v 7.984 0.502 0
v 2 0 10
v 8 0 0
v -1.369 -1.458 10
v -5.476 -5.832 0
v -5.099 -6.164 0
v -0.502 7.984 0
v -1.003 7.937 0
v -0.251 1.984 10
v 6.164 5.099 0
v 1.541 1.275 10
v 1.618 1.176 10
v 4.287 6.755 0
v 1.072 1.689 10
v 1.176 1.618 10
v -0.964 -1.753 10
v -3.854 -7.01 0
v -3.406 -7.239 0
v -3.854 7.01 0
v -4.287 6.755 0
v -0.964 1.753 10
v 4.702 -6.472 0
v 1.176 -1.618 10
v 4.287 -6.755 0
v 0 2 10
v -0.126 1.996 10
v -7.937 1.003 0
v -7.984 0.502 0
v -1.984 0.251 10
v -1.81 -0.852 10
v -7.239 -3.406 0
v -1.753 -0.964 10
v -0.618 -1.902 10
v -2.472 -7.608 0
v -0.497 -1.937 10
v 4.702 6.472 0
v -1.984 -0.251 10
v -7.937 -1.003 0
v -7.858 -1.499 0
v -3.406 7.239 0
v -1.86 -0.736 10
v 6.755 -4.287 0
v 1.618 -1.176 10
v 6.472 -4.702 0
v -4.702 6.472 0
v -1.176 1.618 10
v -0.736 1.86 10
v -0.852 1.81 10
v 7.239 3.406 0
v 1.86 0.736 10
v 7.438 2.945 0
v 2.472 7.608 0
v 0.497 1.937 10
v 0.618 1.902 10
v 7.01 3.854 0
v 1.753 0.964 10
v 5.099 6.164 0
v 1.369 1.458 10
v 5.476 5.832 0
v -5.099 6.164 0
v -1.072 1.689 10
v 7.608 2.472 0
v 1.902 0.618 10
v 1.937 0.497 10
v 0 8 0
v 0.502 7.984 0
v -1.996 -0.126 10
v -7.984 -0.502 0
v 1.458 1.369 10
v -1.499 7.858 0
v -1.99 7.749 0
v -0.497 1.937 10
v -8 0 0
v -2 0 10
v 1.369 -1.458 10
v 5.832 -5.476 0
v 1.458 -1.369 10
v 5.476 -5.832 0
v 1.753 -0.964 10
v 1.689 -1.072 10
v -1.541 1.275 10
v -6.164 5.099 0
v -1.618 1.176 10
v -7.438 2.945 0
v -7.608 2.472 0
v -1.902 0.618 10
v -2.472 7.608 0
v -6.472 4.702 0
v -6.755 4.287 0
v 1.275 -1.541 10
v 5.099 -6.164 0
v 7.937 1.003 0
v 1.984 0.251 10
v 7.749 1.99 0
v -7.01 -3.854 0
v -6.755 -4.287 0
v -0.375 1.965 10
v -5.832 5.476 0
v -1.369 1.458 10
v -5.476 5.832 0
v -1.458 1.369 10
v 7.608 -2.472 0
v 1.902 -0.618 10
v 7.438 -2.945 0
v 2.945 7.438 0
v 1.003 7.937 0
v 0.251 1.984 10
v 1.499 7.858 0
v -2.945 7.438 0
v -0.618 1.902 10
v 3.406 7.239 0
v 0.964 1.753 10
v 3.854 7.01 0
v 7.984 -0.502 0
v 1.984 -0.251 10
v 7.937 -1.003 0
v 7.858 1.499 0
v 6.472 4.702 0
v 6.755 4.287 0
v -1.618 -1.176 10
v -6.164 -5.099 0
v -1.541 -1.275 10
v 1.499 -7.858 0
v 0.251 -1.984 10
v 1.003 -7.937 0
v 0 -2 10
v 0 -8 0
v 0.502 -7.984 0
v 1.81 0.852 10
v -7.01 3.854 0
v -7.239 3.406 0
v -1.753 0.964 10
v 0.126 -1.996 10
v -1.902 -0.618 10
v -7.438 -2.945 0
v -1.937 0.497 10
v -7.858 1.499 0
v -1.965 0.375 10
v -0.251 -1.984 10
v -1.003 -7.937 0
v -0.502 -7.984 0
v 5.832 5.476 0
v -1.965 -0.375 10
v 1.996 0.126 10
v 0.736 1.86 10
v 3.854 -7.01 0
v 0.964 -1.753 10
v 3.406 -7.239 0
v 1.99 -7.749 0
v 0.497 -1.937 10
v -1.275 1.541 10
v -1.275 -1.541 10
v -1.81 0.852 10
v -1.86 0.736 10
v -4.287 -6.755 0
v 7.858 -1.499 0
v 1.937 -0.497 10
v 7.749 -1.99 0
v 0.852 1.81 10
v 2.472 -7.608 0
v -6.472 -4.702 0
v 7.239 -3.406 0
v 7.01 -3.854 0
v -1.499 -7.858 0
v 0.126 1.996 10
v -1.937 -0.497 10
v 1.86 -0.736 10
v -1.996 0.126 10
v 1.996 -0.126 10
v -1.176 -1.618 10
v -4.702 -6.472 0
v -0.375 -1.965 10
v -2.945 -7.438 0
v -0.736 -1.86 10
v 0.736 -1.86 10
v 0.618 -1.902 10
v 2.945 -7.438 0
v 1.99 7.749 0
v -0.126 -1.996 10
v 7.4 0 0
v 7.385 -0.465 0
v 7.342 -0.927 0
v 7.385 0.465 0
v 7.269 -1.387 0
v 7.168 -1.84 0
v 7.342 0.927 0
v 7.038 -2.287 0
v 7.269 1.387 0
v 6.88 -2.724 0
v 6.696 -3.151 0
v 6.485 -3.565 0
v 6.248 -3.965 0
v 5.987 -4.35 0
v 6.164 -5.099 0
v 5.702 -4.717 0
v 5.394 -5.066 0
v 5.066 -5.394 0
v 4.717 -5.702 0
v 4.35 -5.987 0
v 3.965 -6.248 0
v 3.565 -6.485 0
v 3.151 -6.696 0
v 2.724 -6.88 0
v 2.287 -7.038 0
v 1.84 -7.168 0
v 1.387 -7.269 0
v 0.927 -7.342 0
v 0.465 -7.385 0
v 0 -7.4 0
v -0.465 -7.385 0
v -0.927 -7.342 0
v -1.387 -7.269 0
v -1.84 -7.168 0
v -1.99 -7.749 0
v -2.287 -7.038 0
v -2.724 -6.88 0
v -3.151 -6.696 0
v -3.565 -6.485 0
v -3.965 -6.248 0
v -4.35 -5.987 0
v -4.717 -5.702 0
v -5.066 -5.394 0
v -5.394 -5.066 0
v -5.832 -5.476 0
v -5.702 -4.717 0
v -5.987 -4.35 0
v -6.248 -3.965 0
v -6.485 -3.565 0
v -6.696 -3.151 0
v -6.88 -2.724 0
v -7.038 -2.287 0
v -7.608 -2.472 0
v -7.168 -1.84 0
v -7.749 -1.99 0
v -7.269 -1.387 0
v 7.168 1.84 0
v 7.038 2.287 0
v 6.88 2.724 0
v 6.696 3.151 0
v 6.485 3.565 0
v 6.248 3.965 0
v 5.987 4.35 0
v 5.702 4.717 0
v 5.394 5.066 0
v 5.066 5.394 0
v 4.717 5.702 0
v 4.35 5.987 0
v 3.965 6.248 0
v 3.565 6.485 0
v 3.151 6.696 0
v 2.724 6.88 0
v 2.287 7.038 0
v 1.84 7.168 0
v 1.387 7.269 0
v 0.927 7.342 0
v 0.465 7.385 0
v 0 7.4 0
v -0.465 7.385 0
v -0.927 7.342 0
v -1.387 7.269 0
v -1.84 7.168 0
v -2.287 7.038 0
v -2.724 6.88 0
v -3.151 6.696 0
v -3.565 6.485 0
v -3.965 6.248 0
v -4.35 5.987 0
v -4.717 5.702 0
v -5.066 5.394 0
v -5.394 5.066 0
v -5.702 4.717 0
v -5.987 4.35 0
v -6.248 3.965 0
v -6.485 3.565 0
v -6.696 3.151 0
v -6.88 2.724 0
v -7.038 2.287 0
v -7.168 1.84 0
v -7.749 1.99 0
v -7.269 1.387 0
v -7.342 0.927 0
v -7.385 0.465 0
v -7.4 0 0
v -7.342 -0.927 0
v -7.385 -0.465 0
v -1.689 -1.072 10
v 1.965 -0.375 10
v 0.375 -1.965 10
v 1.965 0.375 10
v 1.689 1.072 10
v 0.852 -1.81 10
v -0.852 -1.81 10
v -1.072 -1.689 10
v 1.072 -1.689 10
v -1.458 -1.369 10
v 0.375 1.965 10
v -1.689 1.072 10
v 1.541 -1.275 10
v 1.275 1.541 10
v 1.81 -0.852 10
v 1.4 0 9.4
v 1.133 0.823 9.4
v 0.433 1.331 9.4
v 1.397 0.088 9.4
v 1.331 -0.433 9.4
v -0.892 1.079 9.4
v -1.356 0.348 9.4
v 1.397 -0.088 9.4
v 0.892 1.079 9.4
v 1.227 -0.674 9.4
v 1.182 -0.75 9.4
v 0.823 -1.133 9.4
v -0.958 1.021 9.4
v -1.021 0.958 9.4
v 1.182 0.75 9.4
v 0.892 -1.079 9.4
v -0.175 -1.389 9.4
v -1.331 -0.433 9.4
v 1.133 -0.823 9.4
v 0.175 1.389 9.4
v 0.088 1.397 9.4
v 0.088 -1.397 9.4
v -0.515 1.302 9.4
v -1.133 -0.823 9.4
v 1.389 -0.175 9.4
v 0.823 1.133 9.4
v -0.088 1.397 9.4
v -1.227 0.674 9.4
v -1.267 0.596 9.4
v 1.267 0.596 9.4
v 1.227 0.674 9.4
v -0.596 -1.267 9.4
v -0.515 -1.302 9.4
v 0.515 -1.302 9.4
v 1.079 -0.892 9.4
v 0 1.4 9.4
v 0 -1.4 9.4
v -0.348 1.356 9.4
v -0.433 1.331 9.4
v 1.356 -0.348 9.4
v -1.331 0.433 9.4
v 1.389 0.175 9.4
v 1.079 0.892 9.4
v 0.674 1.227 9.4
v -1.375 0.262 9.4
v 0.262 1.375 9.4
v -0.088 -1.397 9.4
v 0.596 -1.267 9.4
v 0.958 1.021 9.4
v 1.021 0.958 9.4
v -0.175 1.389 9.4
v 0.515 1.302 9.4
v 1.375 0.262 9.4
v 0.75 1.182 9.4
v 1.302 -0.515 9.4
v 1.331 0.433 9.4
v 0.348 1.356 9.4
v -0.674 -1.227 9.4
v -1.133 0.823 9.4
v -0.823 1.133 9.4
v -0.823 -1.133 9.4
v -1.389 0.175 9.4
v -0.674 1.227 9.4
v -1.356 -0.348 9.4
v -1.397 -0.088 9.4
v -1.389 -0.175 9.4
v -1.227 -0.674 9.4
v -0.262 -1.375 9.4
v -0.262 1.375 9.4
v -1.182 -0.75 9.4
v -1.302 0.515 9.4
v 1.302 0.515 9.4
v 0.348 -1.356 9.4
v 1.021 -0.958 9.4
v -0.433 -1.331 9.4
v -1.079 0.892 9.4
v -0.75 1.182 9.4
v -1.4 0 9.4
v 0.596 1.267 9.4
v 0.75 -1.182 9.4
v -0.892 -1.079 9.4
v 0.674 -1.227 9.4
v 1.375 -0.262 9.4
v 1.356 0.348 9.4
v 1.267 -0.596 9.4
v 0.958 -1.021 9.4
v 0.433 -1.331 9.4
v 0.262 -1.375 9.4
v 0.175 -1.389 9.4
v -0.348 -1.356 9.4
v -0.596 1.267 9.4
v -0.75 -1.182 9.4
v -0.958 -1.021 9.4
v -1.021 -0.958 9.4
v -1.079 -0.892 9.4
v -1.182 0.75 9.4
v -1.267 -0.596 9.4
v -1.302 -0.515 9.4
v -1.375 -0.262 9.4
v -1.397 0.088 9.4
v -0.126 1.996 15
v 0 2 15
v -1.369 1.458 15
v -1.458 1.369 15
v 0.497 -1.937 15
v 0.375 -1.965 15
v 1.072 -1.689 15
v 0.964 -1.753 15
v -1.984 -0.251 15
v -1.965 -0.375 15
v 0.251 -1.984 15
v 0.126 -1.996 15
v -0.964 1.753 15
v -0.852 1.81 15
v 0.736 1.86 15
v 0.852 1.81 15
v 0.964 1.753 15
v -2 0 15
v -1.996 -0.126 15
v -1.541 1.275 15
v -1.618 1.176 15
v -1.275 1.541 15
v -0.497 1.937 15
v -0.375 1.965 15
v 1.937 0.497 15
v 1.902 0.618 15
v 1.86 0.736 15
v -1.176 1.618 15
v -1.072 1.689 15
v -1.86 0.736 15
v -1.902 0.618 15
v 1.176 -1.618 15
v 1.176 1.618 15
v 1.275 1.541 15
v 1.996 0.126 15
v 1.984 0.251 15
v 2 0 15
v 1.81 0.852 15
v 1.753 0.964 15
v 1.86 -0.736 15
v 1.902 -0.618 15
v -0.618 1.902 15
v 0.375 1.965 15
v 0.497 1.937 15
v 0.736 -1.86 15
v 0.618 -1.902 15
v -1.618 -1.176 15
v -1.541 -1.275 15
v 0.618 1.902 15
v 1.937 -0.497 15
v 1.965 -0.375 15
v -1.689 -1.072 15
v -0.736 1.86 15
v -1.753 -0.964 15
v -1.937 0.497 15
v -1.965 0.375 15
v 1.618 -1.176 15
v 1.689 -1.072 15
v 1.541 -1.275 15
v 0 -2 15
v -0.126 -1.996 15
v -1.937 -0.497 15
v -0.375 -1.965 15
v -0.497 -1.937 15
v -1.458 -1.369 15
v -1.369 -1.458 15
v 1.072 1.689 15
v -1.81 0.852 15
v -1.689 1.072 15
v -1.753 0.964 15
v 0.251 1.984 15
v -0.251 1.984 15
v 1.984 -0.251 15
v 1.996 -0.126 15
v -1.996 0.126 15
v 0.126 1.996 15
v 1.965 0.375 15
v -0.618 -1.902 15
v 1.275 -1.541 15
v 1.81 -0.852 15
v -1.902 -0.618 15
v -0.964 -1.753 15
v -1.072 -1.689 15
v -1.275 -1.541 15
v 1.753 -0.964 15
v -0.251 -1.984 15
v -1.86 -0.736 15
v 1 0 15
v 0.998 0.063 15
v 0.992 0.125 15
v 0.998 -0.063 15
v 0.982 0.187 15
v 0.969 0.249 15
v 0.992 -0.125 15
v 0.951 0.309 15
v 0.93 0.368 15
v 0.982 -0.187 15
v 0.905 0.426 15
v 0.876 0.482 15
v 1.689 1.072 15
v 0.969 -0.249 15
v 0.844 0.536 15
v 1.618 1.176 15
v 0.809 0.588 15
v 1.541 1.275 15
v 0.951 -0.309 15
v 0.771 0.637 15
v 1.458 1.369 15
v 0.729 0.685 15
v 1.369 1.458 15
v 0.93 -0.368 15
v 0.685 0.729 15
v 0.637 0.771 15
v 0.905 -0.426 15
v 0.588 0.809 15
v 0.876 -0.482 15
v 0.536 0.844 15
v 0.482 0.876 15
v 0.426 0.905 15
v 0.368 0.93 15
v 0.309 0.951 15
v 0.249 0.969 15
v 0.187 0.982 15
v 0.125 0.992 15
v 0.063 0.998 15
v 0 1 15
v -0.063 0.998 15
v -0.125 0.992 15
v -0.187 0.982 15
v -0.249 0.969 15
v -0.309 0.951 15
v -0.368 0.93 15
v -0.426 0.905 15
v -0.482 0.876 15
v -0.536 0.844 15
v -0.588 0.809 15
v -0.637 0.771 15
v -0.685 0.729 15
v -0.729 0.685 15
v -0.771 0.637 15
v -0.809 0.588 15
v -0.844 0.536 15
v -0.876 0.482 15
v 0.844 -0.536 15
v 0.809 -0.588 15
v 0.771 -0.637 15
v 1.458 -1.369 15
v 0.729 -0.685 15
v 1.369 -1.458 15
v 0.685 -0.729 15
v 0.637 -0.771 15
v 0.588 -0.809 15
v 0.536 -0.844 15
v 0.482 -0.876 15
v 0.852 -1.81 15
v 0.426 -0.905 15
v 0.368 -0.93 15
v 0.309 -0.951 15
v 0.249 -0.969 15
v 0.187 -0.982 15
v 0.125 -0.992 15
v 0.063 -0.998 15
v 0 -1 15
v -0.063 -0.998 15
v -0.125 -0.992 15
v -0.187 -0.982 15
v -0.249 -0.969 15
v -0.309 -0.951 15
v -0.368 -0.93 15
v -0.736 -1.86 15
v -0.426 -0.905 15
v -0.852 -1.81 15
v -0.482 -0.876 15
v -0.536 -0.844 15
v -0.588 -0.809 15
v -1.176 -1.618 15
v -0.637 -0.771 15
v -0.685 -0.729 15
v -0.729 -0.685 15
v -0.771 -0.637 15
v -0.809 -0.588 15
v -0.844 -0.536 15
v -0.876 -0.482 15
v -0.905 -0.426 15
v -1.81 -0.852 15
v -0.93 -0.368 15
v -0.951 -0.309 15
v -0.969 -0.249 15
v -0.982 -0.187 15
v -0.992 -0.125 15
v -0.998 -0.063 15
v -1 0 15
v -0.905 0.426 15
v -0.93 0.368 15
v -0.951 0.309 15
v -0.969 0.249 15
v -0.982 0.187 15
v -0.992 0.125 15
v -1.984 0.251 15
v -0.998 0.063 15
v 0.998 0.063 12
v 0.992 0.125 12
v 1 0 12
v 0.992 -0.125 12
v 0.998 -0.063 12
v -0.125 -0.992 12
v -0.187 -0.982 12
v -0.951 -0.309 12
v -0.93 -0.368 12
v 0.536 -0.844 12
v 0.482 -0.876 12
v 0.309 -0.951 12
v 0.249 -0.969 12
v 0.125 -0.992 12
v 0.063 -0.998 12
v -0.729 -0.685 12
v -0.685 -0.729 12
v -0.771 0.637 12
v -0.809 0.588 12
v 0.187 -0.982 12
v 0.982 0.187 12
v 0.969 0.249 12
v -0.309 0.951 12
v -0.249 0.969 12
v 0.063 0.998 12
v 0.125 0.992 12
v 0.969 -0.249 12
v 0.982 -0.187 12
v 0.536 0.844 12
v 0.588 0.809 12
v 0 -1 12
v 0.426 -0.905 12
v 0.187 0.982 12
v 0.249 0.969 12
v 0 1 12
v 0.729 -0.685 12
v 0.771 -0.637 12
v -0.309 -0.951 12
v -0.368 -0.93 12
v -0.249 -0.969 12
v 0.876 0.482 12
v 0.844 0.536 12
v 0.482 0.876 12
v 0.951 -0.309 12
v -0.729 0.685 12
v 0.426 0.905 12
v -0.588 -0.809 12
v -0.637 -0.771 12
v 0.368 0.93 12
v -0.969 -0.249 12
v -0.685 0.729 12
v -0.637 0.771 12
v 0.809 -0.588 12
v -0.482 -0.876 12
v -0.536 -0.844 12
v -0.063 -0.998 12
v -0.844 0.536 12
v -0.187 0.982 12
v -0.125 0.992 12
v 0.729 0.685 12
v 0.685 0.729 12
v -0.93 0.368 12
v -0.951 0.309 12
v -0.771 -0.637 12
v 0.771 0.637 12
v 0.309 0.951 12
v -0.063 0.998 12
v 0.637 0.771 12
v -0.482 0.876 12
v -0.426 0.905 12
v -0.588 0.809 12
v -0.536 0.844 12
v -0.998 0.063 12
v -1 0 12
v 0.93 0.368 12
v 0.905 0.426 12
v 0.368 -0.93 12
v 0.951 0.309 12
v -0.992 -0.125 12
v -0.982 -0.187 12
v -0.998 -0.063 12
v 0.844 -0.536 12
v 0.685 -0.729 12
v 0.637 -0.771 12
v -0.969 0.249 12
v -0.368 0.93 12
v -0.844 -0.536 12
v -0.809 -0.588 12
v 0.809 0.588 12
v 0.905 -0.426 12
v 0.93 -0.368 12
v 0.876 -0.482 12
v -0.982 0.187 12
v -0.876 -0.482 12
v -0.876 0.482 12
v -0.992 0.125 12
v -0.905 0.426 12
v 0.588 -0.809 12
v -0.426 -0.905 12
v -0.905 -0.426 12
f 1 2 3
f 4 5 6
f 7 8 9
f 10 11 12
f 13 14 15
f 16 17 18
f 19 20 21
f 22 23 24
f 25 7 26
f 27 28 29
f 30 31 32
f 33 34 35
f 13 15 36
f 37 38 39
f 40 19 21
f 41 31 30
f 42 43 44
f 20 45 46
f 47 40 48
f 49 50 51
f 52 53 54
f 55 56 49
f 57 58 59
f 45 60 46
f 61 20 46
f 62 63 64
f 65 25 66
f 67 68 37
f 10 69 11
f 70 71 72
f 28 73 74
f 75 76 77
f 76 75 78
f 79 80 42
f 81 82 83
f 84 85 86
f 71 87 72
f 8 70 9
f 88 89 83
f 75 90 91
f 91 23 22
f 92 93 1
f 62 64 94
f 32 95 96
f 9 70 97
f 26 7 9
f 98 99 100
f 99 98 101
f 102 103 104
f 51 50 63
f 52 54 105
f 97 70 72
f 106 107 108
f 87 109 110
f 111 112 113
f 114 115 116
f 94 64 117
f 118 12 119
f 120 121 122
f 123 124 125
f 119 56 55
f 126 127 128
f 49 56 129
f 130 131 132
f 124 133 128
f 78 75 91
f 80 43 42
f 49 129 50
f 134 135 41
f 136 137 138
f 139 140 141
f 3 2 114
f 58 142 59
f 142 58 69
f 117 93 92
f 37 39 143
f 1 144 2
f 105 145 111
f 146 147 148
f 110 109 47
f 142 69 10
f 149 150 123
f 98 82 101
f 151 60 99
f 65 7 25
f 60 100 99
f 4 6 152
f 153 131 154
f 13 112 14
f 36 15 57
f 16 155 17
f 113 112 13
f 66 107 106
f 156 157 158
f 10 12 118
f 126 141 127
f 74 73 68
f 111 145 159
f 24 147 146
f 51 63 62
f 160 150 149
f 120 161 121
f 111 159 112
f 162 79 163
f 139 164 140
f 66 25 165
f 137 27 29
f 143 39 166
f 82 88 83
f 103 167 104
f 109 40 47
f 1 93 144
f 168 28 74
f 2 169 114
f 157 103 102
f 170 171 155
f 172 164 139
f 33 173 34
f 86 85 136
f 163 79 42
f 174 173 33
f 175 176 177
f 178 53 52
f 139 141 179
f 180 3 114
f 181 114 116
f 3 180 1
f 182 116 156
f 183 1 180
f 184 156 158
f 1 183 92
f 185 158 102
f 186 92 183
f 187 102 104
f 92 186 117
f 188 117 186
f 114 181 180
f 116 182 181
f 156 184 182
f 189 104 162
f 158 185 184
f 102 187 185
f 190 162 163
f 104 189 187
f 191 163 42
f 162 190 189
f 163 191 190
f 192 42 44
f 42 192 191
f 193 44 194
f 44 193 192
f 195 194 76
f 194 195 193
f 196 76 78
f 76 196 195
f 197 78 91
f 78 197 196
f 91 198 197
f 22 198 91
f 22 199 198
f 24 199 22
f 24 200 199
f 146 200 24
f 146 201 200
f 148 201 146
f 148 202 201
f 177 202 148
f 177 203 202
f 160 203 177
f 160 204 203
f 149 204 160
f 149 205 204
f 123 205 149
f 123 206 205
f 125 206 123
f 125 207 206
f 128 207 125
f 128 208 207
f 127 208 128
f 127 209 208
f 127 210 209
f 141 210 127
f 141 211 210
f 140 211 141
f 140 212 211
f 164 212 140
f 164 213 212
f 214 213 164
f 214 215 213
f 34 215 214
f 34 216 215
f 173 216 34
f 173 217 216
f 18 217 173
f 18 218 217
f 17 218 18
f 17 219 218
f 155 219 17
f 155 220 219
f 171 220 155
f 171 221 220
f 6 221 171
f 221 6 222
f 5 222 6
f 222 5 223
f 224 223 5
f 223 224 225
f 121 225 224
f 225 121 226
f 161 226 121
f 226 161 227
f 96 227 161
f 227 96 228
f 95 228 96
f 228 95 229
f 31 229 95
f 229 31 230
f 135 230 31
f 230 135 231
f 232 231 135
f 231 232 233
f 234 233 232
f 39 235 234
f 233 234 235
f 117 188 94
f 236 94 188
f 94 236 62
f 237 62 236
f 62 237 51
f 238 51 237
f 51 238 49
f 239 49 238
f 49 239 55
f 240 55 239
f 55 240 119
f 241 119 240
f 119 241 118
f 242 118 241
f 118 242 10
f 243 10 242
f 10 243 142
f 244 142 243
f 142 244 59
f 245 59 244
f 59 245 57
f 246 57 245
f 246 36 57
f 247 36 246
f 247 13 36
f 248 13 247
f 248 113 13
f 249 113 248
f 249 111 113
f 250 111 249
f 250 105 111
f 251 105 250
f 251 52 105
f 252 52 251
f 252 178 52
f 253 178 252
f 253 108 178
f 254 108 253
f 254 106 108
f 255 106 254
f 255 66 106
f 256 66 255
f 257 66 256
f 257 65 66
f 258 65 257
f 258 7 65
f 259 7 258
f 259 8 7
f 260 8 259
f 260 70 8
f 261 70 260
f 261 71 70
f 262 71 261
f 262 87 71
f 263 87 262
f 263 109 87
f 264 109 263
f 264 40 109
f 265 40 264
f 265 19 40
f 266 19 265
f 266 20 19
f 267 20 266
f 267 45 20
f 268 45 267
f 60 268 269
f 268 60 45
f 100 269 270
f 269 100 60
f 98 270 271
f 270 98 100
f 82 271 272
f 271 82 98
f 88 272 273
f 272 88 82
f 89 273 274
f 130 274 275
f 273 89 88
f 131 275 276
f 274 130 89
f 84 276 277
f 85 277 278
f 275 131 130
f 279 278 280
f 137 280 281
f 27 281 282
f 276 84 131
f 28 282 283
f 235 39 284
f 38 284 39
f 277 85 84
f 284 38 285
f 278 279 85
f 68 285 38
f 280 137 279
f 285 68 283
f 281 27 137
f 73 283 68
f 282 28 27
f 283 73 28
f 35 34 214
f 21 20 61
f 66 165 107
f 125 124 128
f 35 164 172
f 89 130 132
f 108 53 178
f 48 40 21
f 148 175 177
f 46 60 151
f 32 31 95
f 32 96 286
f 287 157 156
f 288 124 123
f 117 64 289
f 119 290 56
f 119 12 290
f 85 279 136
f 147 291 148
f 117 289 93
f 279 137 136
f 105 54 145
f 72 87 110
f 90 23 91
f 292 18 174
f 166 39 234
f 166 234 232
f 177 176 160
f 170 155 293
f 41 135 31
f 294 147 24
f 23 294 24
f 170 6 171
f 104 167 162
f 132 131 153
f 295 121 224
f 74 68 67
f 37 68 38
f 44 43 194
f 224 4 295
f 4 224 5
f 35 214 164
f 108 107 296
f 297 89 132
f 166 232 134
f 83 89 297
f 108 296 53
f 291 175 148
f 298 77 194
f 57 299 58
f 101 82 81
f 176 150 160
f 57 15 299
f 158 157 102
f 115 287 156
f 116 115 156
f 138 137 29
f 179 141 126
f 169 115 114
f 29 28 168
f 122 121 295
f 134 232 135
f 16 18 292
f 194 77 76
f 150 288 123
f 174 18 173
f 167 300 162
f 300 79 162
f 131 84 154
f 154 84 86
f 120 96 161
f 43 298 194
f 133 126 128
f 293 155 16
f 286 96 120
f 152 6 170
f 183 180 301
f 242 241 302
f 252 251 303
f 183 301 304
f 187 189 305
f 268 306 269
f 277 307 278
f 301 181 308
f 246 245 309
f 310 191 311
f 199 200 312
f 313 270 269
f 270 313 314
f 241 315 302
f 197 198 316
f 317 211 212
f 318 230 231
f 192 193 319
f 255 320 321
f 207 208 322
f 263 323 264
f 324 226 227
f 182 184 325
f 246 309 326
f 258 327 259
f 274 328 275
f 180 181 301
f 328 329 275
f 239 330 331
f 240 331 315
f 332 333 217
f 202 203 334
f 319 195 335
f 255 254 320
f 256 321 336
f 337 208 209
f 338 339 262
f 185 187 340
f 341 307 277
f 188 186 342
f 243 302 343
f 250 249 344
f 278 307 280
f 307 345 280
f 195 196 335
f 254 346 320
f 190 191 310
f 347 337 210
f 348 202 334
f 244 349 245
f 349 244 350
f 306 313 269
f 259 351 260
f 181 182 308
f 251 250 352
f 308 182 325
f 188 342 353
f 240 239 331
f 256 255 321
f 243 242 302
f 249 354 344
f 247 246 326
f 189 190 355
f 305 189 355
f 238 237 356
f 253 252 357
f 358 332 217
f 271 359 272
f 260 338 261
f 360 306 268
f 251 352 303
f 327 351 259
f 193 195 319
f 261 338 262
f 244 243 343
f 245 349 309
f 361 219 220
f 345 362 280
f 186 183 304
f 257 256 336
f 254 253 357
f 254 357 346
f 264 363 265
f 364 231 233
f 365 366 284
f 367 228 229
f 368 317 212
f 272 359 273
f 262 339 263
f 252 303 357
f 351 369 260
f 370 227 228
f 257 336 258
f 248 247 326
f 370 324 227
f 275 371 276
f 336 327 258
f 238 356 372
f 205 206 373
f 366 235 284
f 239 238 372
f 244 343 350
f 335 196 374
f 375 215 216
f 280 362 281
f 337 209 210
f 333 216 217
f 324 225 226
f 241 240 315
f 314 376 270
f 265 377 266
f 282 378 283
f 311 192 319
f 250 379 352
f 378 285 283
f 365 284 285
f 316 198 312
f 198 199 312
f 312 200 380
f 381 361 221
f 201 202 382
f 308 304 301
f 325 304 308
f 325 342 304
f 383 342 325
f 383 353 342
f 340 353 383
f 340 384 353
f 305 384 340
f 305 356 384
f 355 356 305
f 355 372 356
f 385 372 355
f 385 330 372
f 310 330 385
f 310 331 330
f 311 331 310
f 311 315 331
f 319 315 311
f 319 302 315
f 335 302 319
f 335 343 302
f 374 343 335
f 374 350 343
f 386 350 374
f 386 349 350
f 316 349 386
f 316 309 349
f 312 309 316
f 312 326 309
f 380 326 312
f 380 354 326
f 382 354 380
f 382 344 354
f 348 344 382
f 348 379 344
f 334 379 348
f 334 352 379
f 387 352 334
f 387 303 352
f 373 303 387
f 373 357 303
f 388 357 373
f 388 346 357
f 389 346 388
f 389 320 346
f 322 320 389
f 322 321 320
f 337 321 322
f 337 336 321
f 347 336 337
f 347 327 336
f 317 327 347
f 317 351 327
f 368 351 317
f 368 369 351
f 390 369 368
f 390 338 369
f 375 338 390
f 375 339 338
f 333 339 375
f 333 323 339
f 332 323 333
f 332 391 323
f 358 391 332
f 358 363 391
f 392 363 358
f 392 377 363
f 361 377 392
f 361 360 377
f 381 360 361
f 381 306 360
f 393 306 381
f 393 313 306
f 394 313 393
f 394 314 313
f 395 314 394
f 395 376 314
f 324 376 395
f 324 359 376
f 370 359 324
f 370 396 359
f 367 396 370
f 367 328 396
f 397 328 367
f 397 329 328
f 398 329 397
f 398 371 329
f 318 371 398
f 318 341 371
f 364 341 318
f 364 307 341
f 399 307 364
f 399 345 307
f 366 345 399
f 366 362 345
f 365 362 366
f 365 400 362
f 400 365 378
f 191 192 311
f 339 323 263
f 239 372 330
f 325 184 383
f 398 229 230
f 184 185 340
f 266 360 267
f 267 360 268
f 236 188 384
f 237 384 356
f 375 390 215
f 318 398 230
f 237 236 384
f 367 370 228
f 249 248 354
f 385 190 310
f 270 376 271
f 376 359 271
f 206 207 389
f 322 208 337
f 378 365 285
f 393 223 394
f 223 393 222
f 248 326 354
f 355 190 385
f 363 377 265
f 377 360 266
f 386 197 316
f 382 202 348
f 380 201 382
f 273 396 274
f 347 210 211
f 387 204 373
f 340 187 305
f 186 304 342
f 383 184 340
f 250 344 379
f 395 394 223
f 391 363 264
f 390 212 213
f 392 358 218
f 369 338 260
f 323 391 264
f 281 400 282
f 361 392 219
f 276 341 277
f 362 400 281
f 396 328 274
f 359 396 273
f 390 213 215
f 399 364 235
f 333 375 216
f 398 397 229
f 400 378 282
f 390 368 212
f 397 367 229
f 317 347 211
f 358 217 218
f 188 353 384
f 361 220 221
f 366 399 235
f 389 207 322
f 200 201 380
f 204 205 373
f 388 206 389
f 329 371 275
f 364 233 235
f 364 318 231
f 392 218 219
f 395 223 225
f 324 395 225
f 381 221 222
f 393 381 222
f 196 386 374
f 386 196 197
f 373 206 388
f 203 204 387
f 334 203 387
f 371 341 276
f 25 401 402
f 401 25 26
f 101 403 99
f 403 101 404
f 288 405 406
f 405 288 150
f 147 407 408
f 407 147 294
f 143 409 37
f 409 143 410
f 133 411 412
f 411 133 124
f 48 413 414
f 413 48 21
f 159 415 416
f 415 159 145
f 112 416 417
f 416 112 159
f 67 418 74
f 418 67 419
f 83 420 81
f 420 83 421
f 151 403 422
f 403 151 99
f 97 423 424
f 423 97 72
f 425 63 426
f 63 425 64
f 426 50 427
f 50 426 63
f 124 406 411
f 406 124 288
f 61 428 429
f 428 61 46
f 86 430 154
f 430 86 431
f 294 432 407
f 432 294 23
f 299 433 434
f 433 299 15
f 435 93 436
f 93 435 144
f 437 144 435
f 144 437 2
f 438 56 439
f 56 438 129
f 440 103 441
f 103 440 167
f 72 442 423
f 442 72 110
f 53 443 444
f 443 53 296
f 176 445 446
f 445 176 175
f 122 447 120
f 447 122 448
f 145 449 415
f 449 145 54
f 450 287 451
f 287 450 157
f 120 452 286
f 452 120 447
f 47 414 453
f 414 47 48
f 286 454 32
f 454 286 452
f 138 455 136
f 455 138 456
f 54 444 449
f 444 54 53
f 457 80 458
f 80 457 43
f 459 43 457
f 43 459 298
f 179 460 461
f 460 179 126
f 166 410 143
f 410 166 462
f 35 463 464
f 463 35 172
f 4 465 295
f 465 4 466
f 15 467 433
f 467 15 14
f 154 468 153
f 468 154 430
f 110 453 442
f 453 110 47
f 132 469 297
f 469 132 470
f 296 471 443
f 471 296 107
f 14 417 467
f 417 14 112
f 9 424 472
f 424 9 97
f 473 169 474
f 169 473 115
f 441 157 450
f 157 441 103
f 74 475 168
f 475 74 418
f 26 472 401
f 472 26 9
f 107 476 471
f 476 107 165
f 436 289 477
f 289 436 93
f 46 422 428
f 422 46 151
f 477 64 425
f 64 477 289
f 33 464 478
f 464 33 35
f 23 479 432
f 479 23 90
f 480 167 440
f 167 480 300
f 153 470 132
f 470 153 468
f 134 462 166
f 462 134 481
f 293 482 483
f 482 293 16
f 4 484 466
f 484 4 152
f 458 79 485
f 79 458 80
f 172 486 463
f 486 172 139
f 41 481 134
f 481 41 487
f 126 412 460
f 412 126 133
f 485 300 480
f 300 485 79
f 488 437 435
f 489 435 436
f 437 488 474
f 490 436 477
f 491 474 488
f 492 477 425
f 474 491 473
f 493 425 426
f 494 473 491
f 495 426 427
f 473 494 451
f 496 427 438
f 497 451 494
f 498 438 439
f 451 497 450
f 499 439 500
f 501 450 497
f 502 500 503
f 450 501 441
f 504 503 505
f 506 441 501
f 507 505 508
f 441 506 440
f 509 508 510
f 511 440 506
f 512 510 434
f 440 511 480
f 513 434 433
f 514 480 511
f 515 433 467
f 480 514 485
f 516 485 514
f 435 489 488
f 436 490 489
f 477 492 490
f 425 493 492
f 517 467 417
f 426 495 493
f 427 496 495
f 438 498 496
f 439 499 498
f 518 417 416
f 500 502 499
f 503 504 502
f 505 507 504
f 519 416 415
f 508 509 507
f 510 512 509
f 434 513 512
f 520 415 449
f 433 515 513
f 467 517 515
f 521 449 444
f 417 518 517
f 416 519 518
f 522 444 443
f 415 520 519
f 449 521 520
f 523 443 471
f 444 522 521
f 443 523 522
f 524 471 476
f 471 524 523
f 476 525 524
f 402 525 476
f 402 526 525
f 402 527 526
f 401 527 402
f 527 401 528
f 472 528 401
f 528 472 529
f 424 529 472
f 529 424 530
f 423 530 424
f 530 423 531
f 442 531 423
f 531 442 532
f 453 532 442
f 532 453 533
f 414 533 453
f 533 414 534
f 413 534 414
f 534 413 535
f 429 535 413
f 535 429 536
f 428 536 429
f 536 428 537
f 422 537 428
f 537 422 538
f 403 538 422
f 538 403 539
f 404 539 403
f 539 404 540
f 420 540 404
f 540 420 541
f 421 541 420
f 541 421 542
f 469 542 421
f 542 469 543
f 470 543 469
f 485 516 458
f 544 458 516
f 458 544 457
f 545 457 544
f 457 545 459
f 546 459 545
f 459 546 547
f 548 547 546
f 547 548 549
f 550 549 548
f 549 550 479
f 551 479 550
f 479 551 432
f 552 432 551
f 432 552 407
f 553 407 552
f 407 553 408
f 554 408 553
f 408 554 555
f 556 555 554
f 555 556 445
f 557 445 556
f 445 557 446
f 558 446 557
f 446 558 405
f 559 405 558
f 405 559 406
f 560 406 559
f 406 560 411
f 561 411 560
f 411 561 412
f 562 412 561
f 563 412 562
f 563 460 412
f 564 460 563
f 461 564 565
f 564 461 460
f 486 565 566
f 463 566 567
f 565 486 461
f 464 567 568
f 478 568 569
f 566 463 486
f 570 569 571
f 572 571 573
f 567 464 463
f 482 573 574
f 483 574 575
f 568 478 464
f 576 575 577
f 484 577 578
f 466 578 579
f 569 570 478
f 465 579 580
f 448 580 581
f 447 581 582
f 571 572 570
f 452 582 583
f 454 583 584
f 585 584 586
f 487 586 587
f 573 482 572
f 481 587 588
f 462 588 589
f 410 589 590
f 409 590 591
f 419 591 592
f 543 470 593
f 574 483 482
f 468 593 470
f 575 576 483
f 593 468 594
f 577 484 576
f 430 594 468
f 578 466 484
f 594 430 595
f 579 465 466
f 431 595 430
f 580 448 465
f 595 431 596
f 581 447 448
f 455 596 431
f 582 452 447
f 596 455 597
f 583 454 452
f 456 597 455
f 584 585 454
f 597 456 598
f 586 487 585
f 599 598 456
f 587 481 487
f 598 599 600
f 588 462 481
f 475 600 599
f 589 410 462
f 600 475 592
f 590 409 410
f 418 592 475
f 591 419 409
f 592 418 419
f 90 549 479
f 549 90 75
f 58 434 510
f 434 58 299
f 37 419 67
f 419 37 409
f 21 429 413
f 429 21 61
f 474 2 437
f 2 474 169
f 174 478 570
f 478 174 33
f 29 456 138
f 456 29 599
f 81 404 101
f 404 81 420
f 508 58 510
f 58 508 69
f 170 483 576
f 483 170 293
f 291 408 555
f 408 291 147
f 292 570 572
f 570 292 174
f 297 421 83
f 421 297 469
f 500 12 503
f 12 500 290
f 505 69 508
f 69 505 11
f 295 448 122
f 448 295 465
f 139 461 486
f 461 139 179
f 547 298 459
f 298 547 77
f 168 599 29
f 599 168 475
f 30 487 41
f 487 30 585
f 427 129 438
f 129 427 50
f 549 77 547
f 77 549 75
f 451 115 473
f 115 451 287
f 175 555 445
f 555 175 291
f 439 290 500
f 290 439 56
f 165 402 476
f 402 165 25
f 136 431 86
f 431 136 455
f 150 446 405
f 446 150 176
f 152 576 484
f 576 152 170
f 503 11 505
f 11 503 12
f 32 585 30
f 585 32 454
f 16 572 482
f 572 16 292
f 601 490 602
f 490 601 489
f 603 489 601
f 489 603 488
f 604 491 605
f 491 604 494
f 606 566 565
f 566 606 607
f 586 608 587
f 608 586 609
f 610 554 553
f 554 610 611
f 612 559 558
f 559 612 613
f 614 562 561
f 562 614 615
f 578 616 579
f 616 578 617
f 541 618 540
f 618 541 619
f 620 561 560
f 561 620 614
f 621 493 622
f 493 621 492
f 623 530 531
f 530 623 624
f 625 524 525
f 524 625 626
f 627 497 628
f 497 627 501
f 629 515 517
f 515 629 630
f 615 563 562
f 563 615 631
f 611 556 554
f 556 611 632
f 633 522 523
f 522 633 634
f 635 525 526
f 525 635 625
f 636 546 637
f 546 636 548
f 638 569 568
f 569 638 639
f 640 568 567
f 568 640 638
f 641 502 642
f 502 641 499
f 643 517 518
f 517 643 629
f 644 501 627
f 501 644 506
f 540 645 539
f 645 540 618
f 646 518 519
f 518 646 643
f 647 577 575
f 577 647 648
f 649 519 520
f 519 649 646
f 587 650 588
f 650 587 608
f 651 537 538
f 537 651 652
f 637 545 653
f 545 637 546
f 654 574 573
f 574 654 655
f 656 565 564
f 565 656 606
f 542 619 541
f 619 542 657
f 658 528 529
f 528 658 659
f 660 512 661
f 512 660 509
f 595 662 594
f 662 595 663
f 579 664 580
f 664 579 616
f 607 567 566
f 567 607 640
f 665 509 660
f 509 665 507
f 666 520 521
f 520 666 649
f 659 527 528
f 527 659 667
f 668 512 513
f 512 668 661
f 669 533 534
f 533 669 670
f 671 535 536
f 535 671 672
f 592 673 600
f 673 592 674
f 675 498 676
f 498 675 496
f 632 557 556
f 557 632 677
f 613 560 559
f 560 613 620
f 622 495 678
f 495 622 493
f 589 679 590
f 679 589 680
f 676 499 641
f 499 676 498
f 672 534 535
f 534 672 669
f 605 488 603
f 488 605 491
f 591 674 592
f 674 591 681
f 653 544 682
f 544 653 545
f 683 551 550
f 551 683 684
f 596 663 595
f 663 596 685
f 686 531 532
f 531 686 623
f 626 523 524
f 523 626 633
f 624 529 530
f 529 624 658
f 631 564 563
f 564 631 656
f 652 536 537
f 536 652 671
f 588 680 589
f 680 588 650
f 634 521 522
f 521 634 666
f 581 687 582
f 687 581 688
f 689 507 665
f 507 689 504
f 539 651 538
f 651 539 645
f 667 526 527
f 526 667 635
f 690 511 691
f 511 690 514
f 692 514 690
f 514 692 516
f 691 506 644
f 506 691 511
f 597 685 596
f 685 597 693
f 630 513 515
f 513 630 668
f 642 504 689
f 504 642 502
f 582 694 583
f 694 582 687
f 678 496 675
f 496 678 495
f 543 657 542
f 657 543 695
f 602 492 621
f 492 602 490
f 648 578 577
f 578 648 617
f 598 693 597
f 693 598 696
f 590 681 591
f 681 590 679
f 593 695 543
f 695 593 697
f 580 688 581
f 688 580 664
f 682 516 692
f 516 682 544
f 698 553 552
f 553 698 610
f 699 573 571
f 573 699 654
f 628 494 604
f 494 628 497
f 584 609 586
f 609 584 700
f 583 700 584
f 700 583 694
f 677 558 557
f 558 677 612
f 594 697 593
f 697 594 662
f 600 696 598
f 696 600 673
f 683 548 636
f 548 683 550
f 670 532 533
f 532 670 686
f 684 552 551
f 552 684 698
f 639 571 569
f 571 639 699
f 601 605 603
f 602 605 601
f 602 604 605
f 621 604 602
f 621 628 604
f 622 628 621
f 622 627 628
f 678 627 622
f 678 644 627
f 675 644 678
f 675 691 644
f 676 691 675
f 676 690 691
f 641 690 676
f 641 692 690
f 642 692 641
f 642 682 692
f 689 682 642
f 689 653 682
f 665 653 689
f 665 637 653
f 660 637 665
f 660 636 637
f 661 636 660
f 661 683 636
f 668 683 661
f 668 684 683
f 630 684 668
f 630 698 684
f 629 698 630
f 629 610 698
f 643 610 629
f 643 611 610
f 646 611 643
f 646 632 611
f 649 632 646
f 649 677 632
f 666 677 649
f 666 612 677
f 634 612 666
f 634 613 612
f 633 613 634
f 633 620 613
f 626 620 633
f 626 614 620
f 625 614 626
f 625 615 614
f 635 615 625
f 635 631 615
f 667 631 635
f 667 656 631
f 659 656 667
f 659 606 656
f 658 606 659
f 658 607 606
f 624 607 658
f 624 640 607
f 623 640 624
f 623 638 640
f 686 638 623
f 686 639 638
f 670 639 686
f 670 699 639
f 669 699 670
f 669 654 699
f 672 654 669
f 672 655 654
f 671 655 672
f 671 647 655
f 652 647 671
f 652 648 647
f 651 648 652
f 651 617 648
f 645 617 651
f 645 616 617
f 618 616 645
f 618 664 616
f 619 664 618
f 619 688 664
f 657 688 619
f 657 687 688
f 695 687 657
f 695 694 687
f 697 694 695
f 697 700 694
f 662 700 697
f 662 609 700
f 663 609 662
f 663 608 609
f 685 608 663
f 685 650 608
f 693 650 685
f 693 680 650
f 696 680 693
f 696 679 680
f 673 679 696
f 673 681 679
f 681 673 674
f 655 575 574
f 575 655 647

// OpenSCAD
// Outside diameter of cone base. (All measurements are in millimeters!!)
cone_diameter = 16;
// Height of cone.
cone_height = 10;
//Thickness of cone walls.
wall = 0.6;
// Outside diameter of neck.
neck_diameter = 4;
// Height of neck.
neck_height = 5;
// Diameter of hole for dart. (Depth of hole is automatically 2mm less than neck height.)
hole_size = 2;
union() {
difference() {
    // bottom cylinder
    cylinder(h = cone_height, r1 = cone_diameter/2, r2 = neck_diameter/2, center = false, $fn=100);
    // inside cylinder
    cylinder (h = cone_height - wall, r1 = cone_diameter/2 - wall, r2 = neck_diameter/2 - wall, center = false, $fn=100);
}
difference() {
    // neck
    translate([0,0,cone_height]) cylinder(h = neck_height, r = neck_diameter/2, $fn=100);
    // shaft hole
    translate([0,0,cone_height + 2]) cylinder(h = neck_height - 2, r = hole_size/2, $fn=100);
}
}
    
